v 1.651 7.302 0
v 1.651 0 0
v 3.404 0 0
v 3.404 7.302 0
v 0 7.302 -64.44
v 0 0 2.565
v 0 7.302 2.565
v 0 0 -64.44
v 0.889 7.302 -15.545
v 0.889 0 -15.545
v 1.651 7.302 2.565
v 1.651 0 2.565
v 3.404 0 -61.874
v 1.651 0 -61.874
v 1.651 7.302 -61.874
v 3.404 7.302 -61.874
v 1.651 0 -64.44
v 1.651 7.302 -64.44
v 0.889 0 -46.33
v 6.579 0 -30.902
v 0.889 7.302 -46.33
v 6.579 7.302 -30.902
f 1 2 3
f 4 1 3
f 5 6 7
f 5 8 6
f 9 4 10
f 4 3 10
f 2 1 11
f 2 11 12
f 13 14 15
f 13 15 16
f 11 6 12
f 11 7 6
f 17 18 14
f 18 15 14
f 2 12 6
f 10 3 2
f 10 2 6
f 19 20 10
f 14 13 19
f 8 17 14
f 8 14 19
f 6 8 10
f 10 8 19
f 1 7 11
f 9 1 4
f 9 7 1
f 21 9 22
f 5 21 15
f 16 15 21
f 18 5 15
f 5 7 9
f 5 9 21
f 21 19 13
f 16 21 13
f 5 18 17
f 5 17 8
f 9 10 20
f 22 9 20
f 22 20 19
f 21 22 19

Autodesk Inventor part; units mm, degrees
ref_plane "YZ Plane" through (0, 0, 0) normal (1, 0, 0) x (0, 1, 0)
ref_plane "XZ Plane" through (0, 0, 0) normal (0, 1, 0) x (-1, 0, 0)
ref_plane "XY Plane" through (0, 0, 0) normal (0, 0, 1) x (1, 0, 0)
sketch "Sketch1" plane through (0, 0, 0) normal (0, 1, 0) x (-1, 0, 0)
  line L0 (0, 0) -> (0, -61.8744)
  line L1 (0, 0) -> (-3.4036, 0)
  line L2 (0, -61.8744) -> (-3.4036, -61.8744)
  line L3 (-3.4036, 0) -> (-0.889, -15.5448)
  line L4 (-0.889, -15.5448) -> (-6.5786, -30.9015)
  line L5 (-6.5786, -30.9015) -> (-0.889, -46.3296)
  line L6 (-0.889, -46.3296) -> (-3.4036, -61.8744)
  dimension "d0" = 61.8744
  dimension "d1" = 3.4036
  dimension "d2" = 3.4036
  dimension "d3" = 15.5448
  dimension "d4" = 31.0642
  dimension "d5" = 15.5448
  dimension "d6" = 0.889
  dimension "d7" = 0.889
  dimension "d10" = 6.5786
extrude "Extrusion1" add sketch "Sketch1" along normal blind 7.3025
sketch "Sketch2" plane through (0, 0, 0) normal (0, 0, 1) x (1, 0, 0)
  line L0 (3.4036, 0) -> (0, 0) projected
  line L1 (1.651, 0) -> (0, 0)
  line L2 (0, 7.3025) -> (1.651, 7.3025)
  line L3 (1.651, 7.3025) -> (1.651, 0)
  line L4 (1.651, 0) -> (0, 0)
  line L5 (0, 0) -> (0, 7.3025)
  dimension "d17" = 1.651
sketch "Sketch3" plane through (3.4036, 0, -61.8744) normal (0, 0, -1) x (-1, 0, 0)
  line L0 (3.4036, 7.3025) -> (0, 7.3025) projected
  line L1 (0, 0) -> (3.4036, 0) projected
  line L2 (3.4036, 7.3025) -> (1.7526, 7.3025)
  line L3 (1.7526, 7.3025) -> (1.7526, 0)
  line L4 (1.7526, 0) -> (3.4036, 0)
  line L5 (3.4036, 0) -> (3.4036, 7.3025)
  dimension "d12" = 1.651
extrude "Extrusion2" add sketch "Sketch3" along normal blind 2.5654
extrude "Extrusion3" add sketch "Sketch2" along normal blind 2.5654
properties part number "short_insert_invert_CPY3"
